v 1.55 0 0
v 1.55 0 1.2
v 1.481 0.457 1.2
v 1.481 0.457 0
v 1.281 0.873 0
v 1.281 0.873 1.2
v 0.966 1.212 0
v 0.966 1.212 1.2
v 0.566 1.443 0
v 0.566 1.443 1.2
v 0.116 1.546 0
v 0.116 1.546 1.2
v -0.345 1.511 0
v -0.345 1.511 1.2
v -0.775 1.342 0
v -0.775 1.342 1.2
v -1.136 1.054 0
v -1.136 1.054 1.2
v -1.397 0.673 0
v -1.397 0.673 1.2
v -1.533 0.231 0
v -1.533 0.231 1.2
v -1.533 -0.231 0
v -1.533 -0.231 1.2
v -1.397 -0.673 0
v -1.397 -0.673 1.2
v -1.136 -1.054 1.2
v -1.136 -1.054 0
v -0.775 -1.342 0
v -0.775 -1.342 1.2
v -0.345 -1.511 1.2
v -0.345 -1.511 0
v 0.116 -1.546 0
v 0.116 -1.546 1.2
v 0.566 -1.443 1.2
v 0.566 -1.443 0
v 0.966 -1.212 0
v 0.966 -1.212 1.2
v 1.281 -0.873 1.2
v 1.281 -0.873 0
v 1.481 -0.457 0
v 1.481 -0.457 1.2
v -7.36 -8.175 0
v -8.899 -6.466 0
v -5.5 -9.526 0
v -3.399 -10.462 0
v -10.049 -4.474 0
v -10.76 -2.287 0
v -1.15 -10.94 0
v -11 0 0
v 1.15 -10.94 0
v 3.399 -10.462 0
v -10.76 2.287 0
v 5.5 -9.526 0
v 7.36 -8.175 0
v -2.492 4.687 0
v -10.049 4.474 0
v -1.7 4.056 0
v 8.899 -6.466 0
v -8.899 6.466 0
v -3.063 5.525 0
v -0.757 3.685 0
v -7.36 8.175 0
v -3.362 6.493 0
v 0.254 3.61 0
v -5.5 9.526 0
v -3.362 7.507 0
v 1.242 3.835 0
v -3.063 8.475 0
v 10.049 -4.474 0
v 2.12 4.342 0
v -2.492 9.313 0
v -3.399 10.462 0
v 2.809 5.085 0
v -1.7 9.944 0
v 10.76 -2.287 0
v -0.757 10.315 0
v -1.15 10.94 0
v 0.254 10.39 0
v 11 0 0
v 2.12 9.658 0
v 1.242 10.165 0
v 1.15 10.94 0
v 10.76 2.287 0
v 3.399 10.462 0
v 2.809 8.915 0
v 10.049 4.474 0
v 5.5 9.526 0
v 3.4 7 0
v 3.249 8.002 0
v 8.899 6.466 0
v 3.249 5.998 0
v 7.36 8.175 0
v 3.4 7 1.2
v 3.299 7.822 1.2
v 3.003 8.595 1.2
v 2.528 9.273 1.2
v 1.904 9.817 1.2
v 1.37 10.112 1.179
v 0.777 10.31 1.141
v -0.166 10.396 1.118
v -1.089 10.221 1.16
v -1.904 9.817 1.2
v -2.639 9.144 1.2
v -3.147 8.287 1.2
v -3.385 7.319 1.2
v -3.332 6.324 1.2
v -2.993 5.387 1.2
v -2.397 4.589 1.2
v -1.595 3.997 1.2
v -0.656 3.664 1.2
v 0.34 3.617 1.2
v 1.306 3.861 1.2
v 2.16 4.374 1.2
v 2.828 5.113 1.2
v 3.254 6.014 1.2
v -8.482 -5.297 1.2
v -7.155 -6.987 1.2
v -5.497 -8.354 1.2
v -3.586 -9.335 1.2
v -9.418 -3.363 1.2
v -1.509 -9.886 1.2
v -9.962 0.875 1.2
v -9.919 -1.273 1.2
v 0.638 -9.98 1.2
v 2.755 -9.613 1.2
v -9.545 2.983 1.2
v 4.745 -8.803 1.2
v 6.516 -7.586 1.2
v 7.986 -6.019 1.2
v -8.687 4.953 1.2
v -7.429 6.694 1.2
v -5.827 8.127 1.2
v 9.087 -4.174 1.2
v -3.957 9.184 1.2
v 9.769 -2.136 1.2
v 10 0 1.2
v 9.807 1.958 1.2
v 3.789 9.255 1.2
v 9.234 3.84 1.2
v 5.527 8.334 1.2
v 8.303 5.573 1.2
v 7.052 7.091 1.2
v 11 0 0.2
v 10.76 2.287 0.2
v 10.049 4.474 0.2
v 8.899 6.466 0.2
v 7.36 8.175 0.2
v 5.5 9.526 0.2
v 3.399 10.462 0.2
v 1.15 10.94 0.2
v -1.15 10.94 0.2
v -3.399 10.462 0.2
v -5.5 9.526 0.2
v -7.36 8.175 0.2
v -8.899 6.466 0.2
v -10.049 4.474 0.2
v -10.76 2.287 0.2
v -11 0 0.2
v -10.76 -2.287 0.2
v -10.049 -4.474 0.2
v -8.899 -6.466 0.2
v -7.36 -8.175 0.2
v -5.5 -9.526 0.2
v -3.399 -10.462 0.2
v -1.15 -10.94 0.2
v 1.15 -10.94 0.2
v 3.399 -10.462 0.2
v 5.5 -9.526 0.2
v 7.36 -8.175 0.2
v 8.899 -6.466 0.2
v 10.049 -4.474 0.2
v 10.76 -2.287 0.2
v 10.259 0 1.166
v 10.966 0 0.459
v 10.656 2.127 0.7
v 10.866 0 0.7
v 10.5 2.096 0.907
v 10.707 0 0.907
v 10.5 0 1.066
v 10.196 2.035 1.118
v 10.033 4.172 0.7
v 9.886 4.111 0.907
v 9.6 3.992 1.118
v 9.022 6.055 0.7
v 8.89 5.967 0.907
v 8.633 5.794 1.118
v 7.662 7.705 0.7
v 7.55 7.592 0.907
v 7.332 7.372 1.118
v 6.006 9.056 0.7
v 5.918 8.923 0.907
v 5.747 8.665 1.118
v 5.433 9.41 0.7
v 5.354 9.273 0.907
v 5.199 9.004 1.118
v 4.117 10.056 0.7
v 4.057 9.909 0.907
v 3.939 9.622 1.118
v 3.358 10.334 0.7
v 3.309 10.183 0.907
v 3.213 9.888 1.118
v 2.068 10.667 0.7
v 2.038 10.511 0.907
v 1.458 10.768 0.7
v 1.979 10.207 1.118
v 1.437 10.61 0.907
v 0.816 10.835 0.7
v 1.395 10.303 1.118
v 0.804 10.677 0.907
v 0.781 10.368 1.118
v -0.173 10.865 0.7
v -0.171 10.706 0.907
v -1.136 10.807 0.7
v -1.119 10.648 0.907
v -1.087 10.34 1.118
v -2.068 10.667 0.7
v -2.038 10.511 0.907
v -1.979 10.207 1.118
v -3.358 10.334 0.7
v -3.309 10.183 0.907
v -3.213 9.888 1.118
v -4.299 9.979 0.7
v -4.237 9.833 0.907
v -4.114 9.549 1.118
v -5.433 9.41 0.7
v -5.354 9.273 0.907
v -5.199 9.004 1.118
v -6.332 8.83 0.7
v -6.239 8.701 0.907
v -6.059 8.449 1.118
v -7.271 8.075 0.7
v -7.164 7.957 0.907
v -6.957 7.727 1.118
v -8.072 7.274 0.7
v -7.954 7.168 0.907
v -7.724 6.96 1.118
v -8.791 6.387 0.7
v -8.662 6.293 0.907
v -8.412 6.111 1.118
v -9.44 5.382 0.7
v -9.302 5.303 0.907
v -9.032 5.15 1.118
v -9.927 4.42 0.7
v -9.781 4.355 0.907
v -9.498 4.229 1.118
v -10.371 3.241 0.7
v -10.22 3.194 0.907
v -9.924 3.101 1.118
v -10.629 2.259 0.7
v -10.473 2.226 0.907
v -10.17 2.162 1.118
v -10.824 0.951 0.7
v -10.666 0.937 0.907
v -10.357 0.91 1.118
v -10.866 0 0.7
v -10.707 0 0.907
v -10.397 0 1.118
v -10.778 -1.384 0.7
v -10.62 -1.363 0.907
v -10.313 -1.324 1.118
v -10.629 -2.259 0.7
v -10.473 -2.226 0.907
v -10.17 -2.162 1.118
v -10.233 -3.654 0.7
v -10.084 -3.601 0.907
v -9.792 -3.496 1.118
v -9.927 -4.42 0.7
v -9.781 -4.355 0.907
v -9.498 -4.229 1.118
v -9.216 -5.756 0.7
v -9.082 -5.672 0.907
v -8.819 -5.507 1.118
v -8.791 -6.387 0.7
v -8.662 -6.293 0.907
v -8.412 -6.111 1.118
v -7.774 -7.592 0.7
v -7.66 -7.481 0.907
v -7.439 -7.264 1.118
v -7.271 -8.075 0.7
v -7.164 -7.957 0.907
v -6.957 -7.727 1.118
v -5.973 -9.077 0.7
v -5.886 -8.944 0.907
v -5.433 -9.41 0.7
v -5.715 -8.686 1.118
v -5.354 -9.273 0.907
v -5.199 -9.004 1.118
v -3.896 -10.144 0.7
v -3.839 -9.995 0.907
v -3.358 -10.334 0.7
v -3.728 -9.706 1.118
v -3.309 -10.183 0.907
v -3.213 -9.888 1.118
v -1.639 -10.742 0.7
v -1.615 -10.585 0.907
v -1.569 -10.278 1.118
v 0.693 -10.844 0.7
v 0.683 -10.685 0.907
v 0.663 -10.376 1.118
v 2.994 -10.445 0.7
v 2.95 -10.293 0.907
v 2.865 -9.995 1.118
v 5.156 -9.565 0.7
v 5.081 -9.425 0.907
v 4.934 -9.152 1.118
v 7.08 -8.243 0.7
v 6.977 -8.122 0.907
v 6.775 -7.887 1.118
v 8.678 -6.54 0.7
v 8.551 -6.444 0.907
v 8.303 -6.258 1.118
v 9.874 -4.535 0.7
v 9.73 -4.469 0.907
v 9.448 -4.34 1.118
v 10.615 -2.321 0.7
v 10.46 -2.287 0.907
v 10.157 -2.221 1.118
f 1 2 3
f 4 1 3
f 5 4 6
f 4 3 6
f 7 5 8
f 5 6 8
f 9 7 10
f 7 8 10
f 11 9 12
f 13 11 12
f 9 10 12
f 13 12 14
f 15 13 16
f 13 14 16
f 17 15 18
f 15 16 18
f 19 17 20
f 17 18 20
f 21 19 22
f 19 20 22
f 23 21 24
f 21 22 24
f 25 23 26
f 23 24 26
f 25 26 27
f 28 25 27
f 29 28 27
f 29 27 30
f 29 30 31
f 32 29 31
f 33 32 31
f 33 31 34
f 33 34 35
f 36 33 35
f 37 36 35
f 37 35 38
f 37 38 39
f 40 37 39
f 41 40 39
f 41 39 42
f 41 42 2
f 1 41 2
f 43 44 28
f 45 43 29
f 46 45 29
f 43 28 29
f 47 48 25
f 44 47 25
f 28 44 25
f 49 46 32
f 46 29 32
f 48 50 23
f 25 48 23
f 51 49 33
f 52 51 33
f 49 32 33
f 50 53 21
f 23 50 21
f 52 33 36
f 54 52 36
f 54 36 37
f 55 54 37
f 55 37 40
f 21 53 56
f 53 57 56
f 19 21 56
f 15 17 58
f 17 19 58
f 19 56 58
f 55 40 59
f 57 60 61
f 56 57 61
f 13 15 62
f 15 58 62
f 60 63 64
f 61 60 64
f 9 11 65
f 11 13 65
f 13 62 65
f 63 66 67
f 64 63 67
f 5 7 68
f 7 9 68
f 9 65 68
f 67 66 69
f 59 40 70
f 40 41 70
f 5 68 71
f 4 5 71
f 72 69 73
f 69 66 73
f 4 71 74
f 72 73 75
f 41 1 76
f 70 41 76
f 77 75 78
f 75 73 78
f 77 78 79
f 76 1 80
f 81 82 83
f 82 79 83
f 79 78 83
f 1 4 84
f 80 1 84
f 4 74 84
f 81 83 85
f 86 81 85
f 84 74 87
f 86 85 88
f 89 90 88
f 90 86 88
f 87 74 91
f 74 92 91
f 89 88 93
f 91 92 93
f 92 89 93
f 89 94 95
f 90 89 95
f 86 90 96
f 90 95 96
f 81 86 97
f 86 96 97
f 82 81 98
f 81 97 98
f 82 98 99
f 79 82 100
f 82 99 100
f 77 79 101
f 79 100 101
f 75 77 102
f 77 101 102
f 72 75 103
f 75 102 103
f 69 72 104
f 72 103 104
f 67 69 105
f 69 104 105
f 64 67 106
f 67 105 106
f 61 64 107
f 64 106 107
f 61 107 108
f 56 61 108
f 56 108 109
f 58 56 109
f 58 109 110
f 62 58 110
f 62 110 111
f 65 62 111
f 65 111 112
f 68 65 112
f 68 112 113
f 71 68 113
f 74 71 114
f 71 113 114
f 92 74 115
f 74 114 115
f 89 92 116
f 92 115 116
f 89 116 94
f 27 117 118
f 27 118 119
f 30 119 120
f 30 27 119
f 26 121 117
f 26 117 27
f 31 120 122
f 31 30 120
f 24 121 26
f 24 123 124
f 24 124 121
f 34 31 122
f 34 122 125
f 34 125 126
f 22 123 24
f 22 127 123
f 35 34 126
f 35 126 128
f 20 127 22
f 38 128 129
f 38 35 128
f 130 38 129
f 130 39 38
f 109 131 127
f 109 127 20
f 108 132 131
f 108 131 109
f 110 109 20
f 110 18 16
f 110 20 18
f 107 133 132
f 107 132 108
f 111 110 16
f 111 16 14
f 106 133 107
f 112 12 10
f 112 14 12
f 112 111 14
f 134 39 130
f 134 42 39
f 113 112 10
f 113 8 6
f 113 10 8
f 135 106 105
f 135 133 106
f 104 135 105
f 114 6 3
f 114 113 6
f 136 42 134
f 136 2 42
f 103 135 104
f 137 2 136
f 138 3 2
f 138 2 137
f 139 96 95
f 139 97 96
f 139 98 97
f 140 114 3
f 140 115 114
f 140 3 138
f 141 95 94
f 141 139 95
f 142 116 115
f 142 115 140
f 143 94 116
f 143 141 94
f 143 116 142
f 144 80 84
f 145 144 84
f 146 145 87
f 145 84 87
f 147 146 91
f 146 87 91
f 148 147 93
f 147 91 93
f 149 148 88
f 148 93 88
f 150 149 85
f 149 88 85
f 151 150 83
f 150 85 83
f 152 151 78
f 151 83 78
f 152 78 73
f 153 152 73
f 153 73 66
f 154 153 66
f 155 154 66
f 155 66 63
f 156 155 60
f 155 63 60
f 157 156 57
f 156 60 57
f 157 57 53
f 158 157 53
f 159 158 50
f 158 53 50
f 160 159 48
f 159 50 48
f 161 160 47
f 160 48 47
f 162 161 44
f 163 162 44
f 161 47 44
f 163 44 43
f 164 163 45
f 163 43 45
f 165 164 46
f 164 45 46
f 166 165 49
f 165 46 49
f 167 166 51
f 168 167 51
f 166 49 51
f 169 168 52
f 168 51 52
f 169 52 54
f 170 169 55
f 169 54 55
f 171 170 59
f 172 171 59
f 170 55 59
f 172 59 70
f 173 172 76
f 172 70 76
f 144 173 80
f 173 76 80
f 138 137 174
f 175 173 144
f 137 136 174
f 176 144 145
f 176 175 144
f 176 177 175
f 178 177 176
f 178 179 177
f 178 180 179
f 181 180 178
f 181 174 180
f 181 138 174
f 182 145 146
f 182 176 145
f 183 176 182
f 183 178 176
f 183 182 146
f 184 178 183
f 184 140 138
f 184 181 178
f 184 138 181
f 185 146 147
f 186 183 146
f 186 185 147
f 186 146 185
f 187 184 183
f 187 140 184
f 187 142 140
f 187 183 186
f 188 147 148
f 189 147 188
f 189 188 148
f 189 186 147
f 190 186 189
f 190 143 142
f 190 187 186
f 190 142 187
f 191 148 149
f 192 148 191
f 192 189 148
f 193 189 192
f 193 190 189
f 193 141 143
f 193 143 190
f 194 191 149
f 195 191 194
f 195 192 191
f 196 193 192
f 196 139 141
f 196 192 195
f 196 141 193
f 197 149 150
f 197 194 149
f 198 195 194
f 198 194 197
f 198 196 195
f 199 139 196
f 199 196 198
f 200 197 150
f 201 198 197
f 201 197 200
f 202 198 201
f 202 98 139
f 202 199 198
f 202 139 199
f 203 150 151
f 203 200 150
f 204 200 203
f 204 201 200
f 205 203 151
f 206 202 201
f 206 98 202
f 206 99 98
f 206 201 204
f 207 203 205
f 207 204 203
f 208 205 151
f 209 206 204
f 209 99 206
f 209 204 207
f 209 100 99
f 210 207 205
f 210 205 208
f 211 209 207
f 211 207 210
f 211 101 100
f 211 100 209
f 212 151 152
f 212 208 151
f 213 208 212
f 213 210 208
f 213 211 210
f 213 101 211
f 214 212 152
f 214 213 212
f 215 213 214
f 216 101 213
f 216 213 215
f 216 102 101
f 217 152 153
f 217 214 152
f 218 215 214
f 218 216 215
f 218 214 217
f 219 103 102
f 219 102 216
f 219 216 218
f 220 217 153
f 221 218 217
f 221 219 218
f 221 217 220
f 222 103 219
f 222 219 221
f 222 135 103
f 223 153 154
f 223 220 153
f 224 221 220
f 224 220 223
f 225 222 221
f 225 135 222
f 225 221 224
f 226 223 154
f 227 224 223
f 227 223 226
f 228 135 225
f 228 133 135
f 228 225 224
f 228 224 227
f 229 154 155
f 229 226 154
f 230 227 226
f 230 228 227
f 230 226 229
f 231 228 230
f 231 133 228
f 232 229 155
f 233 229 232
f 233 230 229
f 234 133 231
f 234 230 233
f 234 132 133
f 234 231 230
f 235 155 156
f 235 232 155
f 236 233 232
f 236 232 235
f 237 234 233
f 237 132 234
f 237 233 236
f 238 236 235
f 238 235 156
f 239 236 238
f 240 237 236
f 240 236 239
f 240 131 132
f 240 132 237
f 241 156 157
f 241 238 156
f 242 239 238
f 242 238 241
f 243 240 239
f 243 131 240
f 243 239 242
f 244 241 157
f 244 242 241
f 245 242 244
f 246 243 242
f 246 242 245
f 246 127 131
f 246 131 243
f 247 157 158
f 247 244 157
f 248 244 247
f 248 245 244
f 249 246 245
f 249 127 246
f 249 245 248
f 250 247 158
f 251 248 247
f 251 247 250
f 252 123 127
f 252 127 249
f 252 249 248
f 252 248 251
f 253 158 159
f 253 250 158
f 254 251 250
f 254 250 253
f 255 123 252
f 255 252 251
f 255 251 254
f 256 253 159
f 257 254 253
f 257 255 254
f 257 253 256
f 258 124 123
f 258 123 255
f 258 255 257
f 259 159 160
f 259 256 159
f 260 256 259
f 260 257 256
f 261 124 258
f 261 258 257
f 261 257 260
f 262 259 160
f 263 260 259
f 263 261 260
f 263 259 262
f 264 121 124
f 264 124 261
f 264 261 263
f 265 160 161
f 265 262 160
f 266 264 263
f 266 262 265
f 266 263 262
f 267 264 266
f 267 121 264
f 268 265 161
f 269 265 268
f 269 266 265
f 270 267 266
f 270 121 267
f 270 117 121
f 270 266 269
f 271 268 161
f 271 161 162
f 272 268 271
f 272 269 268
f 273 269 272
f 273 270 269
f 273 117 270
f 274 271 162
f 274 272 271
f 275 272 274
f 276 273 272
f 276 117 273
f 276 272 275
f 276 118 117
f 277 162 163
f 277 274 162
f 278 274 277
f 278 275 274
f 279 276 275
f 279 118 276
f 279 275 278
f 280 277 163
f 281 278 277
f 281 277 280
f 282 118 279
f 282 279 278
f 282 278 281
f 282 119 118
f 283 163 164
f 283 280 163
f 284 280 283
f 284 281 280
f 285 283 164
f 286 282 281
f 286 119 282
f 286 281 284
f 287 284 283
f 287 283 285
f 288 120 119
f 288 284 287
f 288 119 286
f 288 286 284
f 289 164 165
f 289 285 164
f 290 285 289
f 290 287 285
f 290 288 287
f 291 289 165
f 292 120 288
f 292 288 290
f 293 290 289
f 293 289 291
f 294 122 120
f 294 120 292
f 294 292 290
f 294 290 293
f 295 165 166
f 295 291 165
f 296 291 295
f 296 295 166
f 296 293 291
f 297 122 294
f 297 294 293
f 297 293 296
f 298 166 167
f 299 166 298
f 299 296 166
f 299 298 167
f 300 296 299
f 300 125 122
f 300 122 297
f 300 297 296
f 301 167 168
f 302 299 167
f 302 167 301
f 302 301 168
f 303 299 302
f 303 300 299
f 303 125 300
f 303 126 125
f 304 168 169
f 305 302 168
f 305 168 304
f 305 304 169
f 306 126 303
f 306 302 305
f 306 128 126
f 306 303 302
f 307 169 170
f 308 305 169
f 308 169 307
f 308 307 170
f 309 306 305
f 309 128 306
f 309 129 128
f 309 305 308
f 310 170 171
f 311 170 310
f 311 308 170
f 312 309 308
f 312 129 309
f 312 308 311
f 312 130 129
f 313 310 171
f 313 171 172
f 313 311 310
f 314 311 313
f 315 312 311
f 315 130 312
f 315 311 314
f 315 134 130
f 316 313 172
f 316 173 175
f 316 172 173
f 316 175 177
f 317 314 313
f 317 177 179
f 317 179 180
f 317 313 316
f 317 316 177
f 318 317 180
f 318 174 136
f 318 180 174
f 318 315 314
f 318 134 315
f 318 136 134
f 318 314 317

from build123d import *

# Parameters (mm, degrees)
F0_R     = 11
F1_DEPTH = 1.2
F2_R     = 1
F3_R     = 1.55
F3_R_2   = 3.4
F4_DEPTH = 25


with BuildPart() as f1:
    # F0 (on Top) → F1 (new body)
    with BuildSketch(Plane.XY):
        Circle(F0_R)
    extrude(amount=F1_DEPTH)

    # F2
    f2_edges = [f1.edges().sort_by_distance(p)[0] for p in [
        (-11, 0, 1.2),
    ]]
    fillet(f2_edges, radius=F2_R)

    # F3 (on face) → F4 (cut)
    with BuildSketch(Plane.XY.offset(1.2)):
        Circle(F3_R)
        with Locations((0, 7)):
            Circle(F3_R_2)
    extrude(amount=-F4_DEPTH, mode=Mode.SUBTRACT)


solid = f1.part
